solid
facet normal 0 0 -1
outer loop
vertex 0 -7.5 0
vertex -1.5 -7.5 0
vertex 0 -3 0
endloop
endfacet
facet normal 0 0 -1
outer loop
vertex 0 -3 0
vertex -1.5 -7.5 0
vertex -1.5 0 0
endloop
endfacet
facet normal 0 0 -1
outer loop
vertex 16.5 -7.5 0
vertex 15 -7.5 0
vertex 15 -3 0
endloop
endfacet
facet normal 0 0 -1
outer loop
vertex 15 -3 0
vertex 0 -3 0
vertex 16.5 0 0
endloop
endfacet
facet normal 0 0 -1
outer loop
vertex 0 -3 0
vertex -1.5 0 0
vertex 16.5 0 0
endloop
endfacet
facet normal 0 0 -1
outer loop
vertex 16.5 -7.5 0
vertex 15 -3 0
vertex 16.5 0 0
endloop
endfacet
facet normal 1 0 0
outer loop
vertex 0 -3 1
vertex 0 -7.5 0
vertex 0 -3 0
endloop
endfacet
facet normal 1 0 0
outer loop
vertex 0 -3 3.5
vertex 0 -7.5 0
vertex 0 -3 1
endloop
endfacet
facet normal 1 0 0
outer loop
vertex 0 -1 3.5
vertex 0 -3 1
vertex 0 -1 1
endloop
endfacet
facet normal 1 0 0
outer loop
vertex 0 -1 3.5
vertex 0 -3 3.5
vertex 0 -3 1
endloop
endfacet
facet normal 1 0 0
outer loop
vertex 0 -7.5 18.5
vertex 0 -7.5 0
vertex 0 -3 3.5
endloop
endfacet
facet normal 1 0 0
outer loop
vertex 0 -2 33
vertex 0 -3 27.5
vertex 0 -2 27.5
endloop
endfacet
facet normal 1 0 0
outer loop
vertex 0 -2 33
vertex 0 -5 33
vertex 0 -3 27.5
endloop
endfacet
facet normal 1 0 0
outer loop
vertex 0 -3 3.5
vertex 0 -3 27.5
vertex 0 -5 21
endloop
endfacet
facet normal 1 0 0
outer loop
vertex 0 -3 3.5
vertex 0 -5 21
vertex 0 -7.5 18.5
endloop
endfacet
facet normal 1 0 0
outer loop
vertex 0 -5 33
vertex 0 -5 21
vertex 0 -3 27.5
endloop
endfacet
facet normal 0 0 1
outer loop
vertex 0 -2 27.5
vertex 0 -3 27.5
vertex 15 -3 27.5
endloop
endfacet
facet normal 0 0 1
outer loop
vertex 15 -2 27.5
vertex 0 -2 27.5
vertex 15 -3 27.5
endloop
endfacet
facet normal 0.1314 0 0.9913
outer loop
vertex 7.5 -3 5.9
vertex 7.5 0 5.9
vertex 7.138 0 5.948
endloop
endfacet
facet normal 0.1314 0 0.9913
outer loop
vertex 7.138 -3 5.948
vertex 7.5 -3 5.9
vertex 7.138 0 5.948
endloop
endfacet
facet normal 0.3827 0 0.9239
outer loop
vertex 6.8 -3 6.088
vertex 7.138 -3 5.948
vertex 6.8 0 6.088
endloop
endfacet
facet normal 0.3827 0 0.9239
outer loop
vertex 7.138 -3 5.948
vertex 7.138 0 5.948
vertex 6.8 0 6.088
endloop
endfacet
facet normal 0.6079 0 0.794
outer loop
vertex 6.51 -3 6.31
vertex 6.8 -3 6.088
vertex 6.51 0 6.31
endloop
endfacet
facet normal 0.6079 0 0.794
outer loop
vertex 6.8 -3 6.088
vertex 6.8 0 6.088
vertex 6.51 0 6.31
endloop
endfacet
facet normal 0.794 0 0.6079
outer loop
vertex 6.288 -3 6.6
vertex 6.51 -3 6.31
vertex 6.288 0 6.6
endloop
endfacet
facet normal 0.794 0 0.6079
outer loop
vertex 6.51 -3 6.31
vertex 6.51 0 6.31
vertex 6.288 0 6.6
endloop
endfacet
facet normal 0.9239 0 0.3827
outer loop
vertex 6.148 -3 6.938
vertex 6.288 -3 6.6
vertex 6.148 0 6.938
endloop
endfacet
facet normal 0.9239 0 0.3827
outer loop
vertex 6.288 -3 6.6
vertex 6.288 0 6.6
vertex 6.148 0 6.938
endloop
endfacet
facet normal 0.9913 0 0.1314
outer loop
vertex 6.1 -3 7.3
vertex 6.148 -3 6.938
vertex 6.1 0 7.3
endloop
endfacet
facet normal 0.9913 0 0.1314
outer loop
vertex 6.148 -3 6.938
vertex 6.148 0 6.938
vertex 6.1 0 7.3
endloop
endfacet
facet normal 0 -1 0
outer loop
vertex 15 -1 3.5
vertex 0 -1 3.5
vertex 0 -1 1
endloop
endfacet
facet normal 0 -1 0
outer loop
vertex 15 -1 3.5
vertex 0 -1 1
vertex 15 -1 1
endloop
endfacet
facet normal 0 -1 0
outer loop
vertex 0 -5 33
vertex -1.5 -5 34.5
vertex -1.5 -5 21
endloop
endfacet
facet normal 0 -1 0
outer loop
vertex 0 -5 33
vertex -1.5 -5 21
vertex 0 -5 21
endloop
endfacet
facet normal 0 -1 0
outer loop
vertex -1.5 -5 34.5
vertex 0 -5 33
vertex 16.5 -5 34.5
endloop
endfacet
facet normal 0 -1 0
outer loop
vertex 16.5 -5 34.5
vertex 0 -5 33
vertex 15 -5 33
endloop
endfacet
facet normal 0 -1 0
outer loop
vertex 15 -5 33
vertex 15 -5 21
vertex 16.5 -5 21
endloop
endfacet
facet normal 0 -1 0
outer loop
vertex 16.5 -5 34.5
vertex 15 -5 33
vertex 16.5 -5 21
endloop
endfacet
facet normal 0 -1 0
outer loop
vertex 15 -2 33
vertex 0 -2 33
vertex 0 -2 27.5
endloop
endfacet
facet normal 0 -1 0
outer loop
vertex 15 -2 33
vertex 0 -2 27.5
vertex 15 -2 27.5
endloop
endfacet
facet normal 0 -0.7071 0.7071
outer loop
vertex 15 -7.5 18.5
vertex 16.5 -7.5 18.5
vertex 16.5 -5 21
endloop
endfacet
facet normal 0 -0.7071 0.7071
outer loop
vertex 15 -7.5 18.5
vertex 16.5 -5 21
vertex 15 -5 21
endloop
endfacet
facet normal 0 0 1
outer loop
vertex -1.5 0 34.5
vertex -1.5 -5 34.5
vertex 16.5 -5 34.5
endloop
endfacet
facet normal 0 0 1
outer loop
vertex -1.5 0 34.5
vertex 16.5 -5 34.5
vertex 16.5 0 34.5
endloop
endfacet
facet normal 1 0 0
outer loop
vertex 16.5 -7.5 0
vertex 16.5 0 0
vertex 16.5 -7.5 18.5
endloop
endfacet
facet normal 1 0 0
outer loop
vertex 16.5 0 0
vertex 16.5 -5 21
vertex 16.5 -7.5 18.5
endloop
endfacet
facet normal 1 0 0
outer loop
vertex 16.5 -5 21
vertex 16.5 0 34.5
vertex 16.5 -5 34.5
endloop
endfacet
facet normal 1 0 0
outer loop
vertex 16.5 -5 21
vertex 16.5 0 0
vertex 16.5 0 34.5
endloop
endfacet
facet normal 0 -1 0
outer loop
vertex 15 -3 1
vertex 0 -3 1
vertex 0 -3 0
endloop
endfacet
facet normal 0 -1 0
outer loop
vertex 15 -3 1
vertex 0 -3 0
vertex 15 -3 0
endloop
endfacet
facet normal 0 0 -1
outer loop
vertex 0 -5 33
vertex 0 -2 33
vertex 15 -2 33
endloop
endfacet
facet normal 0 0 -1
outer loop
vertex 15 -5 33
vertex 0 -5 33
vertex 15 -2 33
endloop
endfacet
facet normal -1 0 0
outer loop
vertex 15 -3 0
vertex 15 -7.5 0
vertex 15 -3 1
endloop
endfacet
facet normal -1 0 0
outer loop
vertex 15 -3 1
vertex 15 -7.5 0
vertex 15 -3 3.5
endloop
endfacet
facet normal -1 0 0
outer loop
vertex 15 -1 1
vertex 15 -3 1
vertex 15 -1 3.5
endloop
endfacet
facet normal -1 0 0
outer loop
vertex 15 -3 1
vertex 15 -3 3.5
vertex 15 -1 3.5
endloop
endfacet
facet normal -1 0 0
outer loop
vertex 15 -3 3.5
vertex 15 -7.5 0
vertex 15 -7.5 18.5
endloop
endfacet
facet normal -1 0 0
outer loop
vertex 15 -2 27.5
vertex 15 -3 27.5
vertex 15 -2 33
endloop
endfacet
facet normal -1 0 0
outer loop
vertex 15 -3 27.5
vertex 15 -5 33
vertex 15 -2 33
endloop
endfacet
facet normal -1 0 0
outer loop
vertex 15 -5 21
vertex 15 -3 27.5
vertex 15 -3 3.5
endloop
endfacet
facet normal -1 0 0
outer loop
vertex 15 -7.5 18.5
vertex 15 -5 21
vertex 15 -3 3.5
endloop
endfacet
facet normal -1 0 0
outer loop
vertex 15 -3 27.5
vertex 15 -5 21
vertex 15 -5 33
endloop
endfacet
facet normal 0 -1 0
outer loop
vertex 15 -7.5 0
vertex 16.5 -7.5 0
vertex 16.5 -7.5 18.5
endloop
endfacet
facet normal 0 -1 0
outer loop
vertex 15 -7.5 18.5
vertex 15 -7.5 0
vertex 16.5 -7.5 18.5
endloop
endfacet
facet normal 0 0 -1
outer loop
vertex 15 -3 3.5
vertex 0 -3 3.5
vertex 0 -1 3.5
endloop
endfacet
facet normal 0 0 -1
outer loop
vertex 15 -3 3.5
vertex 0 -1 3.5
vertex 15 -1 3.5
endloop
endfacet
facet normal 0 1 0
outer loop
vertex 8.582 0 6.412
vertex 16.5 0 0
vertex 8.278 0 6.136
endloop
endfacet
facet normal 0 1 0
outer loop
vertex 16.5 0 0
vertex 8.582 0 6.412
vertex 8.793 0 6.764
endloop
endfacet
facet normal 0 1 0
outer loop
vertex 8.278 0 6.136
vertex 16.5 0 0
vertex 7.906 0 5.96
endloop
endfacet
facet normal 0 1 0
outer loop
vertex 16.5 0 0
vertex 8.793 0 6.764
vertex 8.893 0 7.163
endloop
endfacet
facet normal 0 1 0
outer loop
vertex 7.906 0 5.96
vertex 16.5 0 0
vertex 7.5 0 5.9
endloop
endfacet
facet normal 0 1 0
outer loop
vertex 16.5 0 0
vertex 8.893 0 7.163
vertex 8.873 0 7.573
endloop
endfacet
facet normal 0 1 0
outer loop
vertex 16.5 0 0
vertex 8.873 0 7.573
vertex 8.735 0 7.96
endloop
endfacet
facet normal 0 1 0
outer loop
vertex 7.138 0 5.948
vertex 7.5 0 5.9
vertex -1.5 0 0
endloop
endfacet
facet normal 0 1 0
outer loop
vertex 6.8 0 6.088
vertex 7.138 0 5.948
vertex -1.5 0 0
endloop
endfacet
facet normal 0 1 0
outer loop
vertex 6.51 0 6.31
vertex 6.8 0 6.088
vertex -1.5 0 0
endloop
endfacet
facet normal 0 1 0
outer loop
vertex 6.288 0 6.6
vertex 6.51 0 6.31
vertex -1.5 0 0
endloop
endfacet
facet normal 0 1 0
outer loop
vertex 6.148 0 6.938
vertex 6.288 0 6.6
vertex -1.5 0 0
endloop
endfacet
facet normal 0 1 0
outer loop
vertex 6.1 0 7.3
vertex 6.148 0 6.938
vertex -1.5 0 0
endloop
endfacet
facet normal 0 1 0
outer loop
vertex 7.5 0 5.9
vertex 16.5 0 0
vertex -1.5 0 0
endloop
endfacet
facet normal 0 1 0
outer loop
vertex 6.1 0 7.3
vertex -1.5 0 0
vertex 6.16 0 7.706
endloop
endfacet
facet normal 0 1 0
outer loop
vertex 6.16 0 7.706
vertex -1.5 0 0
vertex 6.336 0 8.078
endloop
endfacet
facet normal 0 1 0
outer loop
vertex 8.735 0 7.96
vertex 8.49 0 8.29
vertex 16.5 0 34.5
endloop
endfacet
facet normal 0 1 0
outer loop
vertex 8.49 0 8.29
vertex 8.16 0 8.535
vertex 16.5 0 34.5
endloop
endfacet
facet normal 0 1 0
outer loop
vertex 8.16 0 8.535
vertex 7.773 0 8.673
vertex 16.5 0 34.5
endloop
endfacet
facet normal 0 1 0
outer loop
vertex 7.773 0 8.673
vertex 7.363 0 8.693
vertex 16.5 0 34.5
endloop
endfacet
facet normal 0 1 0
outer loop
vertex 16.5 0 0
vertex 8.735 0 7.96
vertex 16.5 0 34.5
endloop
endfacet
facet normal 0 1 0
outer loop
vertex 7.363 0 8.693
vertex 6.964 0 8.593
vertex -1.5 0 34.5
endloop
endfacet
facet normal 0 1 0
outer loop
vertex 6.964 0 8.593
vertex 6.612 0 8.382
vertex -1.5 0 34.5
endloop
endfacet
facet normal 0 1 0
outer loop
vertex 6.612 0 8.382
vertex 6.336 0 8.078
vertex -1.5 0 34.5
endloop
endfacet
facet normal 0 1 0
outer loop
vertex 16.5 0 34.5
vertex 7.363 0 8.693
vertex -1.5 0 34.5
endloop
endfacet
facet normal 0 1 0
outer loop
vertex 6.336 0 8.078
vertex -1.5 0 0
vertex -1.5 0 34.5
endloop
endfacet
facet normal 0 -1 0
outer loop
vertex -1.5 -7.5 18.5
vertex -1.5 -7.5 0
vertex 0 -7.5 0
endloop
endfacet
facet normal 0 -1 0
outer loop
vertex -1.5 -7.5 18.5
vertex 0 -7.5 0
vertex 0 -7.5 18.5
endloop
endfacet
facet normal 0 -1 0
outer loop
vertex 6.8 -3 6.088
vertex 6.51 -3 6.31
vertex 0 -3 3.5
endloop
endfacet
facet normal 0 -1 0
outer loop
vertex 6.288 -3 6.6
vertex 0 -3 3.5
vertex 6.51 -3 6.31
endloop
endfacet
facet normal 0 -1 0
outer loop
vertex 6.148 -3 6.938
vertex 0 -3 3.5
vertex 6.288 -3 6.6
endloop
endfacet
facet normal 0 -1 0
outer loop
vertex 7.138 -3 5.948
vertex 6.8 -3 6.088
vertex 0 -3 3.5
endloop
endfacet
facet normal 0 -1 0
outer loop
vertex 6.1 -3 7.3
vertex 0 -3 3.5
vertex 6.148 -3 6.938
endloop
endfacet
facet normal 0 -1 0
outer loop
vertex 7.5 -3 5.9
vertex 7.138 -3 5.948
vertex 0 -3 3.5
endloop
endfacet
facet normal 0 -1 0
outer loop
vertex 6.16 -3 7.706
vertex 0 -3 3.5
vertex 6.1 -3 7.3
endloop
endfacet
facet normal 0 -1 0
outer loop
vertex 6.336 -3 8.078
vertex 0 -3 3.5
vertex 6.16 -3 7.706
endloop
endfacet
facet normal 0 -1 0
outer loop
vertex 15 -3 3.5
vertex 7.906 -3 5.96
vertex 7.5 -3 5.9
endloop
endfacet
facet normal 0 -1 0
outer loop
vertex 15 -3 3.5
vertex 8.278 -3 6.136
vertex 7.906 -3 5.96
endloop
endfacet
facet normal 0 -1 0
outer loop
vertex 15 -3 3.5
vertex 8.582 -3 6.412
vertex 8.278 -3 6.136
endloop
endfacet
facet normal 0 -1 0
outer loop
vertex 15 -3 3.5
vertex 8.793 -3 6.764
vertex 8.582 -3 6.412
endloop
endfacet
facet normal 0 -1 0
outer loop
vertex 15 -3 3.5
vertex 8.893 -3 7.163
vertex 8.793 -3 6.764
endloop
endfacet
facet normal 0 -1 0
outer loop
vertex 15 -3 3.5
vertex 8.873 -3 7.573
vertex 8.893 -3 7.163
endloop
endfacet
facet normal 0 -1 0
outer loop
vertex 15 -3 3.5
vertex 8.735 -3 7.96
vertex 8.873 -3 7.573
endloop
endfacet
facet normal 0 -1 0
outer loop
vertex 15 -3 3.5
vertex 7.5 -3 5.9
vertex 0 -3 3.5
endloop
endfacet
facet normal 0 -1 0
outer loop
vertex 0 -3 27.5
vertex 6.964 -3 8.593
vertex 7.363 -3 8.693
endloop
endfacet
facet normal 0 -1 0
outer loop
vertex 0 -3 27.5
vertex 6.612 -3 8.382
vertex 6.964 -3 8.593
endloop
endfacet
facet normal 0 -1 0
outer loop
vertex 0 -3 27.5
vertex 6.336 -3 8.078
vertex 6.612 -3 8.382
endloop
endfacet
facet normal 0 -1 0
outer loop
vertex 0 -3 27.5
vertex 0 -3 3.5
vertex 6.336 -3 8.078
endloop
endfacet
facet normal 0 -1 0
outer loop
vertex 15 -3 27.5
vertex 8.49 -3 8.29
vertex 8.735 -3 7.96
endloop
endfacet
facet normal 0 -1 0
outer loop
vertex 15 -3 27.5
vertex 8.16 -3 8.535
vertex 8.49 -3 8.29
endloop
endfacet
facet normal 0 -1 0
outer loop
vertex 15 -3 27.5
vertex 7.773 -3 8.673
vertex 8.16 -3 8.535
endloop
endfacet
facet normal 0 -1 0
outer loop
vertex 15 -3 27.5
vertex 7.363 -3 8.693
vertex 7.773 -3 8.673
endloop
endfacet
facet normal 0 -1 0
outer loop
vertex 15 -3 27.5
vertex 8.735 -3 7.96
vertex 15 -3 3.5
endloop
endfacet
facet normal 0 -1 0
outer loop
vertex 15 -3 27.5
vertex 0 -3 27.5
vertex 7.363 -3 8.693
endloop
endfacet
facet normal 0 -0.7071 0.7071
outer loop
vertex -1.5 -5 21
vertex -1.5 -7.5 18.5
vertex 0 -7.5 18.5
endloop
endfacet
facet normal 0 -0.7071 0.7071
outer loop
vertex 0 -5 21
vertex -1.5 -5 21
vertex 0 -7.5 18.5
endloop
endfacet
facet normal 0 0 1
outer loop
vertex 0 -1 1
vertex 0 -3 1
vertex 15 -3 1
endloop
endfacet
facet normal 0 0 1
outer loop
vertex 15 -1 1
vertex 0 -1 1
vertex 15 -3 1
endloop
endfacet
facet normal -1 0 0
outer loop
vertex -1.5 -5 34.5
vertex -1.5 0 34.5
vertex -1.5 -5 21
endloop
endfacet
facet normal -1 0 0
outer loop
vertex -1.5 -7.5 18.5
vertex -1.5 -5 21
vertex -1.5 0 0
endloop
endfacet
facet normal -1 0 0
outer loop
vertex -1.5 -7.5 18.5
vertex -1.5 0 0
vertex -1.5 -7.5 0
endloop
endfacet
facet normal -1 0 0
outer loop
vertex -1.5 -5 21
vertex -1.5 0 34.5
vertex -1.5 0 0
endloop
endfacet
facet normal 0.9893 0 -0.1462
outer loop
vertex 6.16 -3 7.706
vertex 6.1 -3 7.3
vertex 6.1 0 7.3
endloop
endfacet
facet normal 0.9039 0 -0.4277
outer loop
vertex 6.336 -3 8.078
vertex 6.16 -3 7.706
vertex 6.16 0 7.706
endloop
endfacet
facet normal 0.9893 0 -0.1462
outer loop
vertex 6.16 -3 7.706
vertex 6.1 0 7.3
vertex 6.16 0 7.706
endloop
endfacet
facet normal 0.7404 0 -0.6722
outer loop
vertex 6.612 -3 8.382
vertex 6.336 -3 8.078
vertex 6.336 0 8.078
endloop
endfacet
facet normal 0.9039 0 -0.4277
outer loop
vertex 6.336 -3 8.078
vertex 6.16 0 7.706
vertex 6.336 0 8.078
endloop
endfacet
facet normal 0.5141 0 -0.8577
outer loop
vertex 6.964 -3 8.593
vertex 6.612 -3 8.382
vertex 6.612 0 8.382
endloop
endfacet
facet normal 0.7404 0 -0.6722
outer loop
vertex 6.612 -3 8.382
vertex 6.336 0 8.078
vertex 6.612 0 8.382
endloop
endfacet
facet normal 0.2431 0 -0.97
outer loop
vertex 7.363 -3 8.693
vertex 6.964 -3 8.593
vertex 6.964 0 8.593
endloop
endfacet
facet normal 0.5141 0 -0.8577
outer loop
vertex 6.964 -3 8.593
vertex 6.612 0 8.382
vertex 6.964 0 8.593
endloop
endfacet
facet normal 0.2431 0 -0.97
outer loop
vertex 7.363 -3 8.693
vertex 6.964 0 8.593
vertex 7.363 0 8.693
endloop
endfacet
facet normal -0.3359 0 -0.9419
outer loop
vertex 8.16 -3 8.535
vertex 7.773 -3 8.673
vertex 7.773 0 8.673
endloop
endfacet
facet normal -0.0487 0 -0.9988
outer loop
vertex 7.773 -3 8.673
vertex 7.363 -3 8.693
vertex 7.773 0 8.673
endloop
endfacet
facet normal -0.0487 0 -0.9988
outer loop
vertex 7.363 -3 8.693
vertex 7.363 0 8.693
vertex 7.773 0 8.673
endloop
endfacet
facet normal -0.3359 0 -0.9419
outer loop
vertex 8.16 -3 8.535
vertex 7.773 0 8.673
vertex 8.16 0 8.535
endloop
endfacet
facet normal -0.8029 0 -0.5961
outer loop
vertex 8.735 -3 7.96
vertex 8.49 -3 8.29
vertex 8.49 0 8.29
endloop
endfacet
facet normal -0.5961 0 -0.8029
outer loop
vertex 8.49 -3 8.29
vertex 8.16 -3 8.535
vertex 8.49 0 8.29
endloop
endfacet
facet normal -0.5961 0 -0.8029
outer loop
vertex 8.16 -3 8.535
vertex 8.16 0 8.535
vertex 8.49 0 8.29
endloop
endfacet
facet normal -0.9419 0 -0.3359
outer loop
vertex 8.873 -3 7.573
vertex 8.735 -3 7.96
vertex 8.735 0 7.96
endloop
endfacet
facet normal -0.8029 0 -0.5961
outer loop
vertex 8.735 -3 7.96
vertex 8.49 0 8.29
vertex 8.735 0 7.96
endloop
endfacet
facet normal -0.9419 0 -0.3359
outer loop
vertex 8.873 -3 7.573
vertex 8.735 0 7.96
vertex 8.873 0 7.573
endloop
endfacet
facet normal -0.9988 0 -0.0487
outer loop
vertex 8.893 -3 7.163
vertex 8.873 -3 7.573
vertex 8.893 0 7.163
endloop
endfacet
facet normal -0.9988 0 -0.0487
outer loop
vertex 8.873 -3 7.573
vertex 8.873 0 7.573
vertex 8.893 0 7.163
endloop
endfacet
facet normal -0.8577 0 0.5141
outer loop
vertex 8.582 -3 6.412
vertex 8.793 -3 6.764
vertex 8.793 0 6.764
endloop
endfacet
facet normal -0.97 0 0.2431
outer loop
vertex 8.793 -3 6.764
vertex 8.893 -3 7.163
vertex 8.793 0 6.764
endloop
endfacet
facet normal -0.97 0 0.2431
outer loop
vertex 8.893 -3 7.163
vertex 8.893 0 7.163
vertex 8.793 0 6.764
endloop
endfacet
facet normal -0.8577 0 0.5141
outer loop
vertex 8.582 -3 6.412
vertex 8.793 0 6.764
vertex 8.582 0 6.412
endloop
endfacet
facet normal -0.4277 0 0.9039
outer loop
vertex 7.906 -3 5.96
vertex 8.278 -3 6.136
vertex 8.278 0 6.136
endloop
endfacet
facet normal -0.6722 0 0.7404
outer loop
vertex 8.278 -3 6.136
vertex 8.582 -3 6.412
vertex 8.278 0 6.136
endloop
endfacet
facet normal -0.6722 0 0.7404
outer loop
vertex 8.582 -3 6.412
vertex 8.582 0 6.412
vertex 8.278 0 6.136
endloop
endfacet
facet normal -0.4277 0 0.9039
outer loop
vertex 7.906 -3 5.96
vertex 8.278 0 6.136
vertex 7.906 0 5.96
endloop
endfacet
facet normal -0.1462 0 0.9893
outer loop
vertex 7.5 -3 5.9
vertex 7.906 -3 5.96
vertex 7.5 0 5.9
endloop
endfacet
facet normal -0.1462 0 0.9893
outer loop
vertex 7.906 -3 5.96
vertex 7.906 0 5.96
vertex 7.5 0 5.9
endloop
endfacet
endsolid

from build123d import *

# Parameters (mm, degrees)
F0_W      = 15
F0_H      = 33
F1_DEPTH  = 3
F2_W      = 15
F2_H      = 2.5
F3_DEPTH  = 2
F4_W      = 15
F4_H      = 5.5
F5_DEPTH  = 1
F7_DEPTH  = 25
F9_DEPTH  = 1.5
F10_W     = 2.5
F10_H     = 21
F11_DEPTH = 1.5
F14_SIZE  = 2.49999
F15_W     = 3
F15_H     = 34.5
F16_DEPTH = 8.25
F17_W     = 8.25
F17_H     = 10
F18_DEPTH = 25
F19_DEPTH = 6
F21_DEPTH = 25
F22_DEPTH = 25


# Not quite as in the source:
# - a fillet or chamfer is up to 0.001 mm smaller than in the source, because OpenCascade refuses the exact size


with BuildPart() as f1:
    # F0 (on Front) → F1 (new body)
    with BuildSketch(Plane.XZ):
        with Locations((7.5, 16.5)):
            Rectangle(F0_W, F0_H)
    extrude(amount=F1_DEPTH)

    # F2 (on face) → F3 (cut)
    with BuildSketch(Plane.XZ.offset(3)):
        with Locations((7.5, 2.25)):
            Rectangle(F2_W, F2_H)
    extrude(amount=-F3_DEPTH, mode=Mode.SUBTRACT)

    # F4 (on face) → F5 (cut)
    with BuildSketch(Plane.XZ.offset(3)):
        with Locations((7.5, 30.25)):
            Rectangle(F4_W, F4_H)
    extrude(amount=-F5_DEPTH, mode=Mode.SUBTRACT)

    # F6 (on face) → F7 (cut)
    with BuildSketch(Plane(origin=(0, 0, 0), x_dir=(-1, 0, 0), z_dir=(0, 1, 0))):
        with BuildLine():
            ThreePointArc((-7.5, 5.9), (-6.5100505063, 6.3100505063), (-6.1, 7.3))
            ThreePointArc((-6.1, 7.3), (-8.4899494937, 8.2899494937), (-7.5, 5.9))
        make_face()
    extrude(amount=-F7_DEPTH, mode=Mode.SUBTRACT)

    # F8 (on face) → F9 (join)
    with BuildSketch(Plane.XY.offset(33)):
        Polygon((16.5, 0), (0, 0), (-1.5, 0), (-1.5, -5), (15, -5), (16.5, -5), align=None)
    extrude(amount=F9_DEPTH)

    # F10 (on face) → F11 (join, through all)
    with BuildSketch(Plane.YZ.offset(16.5)):
        Polygon((0, 34.5), (-5, 34.5), (-5, 21), (-5, 0), (0, 0), align=None)
        with Locations((-6.25, 10.5)):
            Rectangle(F10_W, F10_H)
    extrude(amount=-F11_DEPTH)

    # F13: F1 across plane


with BuildPart() as f1_1:
    add(f1.part)
    add(f1.part.mirror(Plane.YZ.offset(7.5)))

    # F14 (size 2.5 in the source; OpenCascade refuses exactly that, so slightly less here)
    f14_edges = [f1_1.edges().sort_by_distance(p)[0] for p in [
        (15.75, -7.5, 21),
        (-0.75, -7.5, 21),
    ]]
    chamfer(f14_edges, length=F14_SIZE)

    # F15 (on face) → F16 (join)
    with BuildSketch(Plane.YZ.offset(16.5)):
        with Locations((-1.5, 17.25)):
            Rectangle(F15_W, F15_H)
    extrude(amount=F16_DEPTH)

    # F17 (on face) → F18 (cut)
    with BuildSketch(Plane.XZ.offset(3)):
        with Locations((20.625, 29.5)):
            Rectangle(F17_W, F17_H)
    extrude(amount=-F18_DEPTH, mode=Mode.SUBTRACT)

    # F19 (add): a face of the model
    f19_faces = [f1_1.faces().sort_by_distance(p)[0] for p in [
        (20.625, -3, 12.25),
    ]]
    extrude(f19_faces, amount=F19_DEPTH)

    # F20 (on face) → F21 (cut)
    with BuildSketch(Plane(origin=(0, 0, 0), x_dir=(-1, 0, 0), z_dir=(0, 1, 0))):
        with BuildLine():
            ThreePointArc((-22.15, 8.3), (-20.75, 6.9), (-19.35, 8.3))
            Line((-19.35, 8.3), (-20.75, 8.3))
            Line((-20.75, 8.3), (-22.15, 8.3))
        make_face()
        with BuildLine():
            Line((-20.75, 8.3), (-19.35, 8.3))
            ThreePointArc((-19.35, 8.3), (-19.7600505063, 9.2899494937), (-20.75, 9.7))
            Line((-20.75, 9.7), (-20.75, 8.3))
        make_face()
        with BuildLine():
            ThreePointArc((-19.35, 18.3), (-21.7399494937, 19.2899494937), (-20.75, 16.9))
            ThreePointArc((-20.75, 16.9), (-19.7600505063, 17.3100505063), (-19.35, 18.3))
        make_face()
        with BuildLine():
            Line((-22.15, 8.3), (-20.75, 8.3))
            Line((-20.75, 8.3), (-20.75, 9.7))
            ThreePointArc((-20.75, 9.7), (-21.7399494937, 9.2899494937), (-22.15, 8.3))
        make_face()
    extrude(amount=-F21_DEPTH, mode=Mode.SUBTRACT)

    # F22 (cut): a face of the model
    f22_faces = [f1_1.faces().sort_by_distance(p)[0] for p in [
        (20.625, -4.5, 24.5),
    ]]
    extrude(f22_faces, amount=-F22_DEPTH, mode=Mode.SUBTRACT)


solid = f1_1.part
